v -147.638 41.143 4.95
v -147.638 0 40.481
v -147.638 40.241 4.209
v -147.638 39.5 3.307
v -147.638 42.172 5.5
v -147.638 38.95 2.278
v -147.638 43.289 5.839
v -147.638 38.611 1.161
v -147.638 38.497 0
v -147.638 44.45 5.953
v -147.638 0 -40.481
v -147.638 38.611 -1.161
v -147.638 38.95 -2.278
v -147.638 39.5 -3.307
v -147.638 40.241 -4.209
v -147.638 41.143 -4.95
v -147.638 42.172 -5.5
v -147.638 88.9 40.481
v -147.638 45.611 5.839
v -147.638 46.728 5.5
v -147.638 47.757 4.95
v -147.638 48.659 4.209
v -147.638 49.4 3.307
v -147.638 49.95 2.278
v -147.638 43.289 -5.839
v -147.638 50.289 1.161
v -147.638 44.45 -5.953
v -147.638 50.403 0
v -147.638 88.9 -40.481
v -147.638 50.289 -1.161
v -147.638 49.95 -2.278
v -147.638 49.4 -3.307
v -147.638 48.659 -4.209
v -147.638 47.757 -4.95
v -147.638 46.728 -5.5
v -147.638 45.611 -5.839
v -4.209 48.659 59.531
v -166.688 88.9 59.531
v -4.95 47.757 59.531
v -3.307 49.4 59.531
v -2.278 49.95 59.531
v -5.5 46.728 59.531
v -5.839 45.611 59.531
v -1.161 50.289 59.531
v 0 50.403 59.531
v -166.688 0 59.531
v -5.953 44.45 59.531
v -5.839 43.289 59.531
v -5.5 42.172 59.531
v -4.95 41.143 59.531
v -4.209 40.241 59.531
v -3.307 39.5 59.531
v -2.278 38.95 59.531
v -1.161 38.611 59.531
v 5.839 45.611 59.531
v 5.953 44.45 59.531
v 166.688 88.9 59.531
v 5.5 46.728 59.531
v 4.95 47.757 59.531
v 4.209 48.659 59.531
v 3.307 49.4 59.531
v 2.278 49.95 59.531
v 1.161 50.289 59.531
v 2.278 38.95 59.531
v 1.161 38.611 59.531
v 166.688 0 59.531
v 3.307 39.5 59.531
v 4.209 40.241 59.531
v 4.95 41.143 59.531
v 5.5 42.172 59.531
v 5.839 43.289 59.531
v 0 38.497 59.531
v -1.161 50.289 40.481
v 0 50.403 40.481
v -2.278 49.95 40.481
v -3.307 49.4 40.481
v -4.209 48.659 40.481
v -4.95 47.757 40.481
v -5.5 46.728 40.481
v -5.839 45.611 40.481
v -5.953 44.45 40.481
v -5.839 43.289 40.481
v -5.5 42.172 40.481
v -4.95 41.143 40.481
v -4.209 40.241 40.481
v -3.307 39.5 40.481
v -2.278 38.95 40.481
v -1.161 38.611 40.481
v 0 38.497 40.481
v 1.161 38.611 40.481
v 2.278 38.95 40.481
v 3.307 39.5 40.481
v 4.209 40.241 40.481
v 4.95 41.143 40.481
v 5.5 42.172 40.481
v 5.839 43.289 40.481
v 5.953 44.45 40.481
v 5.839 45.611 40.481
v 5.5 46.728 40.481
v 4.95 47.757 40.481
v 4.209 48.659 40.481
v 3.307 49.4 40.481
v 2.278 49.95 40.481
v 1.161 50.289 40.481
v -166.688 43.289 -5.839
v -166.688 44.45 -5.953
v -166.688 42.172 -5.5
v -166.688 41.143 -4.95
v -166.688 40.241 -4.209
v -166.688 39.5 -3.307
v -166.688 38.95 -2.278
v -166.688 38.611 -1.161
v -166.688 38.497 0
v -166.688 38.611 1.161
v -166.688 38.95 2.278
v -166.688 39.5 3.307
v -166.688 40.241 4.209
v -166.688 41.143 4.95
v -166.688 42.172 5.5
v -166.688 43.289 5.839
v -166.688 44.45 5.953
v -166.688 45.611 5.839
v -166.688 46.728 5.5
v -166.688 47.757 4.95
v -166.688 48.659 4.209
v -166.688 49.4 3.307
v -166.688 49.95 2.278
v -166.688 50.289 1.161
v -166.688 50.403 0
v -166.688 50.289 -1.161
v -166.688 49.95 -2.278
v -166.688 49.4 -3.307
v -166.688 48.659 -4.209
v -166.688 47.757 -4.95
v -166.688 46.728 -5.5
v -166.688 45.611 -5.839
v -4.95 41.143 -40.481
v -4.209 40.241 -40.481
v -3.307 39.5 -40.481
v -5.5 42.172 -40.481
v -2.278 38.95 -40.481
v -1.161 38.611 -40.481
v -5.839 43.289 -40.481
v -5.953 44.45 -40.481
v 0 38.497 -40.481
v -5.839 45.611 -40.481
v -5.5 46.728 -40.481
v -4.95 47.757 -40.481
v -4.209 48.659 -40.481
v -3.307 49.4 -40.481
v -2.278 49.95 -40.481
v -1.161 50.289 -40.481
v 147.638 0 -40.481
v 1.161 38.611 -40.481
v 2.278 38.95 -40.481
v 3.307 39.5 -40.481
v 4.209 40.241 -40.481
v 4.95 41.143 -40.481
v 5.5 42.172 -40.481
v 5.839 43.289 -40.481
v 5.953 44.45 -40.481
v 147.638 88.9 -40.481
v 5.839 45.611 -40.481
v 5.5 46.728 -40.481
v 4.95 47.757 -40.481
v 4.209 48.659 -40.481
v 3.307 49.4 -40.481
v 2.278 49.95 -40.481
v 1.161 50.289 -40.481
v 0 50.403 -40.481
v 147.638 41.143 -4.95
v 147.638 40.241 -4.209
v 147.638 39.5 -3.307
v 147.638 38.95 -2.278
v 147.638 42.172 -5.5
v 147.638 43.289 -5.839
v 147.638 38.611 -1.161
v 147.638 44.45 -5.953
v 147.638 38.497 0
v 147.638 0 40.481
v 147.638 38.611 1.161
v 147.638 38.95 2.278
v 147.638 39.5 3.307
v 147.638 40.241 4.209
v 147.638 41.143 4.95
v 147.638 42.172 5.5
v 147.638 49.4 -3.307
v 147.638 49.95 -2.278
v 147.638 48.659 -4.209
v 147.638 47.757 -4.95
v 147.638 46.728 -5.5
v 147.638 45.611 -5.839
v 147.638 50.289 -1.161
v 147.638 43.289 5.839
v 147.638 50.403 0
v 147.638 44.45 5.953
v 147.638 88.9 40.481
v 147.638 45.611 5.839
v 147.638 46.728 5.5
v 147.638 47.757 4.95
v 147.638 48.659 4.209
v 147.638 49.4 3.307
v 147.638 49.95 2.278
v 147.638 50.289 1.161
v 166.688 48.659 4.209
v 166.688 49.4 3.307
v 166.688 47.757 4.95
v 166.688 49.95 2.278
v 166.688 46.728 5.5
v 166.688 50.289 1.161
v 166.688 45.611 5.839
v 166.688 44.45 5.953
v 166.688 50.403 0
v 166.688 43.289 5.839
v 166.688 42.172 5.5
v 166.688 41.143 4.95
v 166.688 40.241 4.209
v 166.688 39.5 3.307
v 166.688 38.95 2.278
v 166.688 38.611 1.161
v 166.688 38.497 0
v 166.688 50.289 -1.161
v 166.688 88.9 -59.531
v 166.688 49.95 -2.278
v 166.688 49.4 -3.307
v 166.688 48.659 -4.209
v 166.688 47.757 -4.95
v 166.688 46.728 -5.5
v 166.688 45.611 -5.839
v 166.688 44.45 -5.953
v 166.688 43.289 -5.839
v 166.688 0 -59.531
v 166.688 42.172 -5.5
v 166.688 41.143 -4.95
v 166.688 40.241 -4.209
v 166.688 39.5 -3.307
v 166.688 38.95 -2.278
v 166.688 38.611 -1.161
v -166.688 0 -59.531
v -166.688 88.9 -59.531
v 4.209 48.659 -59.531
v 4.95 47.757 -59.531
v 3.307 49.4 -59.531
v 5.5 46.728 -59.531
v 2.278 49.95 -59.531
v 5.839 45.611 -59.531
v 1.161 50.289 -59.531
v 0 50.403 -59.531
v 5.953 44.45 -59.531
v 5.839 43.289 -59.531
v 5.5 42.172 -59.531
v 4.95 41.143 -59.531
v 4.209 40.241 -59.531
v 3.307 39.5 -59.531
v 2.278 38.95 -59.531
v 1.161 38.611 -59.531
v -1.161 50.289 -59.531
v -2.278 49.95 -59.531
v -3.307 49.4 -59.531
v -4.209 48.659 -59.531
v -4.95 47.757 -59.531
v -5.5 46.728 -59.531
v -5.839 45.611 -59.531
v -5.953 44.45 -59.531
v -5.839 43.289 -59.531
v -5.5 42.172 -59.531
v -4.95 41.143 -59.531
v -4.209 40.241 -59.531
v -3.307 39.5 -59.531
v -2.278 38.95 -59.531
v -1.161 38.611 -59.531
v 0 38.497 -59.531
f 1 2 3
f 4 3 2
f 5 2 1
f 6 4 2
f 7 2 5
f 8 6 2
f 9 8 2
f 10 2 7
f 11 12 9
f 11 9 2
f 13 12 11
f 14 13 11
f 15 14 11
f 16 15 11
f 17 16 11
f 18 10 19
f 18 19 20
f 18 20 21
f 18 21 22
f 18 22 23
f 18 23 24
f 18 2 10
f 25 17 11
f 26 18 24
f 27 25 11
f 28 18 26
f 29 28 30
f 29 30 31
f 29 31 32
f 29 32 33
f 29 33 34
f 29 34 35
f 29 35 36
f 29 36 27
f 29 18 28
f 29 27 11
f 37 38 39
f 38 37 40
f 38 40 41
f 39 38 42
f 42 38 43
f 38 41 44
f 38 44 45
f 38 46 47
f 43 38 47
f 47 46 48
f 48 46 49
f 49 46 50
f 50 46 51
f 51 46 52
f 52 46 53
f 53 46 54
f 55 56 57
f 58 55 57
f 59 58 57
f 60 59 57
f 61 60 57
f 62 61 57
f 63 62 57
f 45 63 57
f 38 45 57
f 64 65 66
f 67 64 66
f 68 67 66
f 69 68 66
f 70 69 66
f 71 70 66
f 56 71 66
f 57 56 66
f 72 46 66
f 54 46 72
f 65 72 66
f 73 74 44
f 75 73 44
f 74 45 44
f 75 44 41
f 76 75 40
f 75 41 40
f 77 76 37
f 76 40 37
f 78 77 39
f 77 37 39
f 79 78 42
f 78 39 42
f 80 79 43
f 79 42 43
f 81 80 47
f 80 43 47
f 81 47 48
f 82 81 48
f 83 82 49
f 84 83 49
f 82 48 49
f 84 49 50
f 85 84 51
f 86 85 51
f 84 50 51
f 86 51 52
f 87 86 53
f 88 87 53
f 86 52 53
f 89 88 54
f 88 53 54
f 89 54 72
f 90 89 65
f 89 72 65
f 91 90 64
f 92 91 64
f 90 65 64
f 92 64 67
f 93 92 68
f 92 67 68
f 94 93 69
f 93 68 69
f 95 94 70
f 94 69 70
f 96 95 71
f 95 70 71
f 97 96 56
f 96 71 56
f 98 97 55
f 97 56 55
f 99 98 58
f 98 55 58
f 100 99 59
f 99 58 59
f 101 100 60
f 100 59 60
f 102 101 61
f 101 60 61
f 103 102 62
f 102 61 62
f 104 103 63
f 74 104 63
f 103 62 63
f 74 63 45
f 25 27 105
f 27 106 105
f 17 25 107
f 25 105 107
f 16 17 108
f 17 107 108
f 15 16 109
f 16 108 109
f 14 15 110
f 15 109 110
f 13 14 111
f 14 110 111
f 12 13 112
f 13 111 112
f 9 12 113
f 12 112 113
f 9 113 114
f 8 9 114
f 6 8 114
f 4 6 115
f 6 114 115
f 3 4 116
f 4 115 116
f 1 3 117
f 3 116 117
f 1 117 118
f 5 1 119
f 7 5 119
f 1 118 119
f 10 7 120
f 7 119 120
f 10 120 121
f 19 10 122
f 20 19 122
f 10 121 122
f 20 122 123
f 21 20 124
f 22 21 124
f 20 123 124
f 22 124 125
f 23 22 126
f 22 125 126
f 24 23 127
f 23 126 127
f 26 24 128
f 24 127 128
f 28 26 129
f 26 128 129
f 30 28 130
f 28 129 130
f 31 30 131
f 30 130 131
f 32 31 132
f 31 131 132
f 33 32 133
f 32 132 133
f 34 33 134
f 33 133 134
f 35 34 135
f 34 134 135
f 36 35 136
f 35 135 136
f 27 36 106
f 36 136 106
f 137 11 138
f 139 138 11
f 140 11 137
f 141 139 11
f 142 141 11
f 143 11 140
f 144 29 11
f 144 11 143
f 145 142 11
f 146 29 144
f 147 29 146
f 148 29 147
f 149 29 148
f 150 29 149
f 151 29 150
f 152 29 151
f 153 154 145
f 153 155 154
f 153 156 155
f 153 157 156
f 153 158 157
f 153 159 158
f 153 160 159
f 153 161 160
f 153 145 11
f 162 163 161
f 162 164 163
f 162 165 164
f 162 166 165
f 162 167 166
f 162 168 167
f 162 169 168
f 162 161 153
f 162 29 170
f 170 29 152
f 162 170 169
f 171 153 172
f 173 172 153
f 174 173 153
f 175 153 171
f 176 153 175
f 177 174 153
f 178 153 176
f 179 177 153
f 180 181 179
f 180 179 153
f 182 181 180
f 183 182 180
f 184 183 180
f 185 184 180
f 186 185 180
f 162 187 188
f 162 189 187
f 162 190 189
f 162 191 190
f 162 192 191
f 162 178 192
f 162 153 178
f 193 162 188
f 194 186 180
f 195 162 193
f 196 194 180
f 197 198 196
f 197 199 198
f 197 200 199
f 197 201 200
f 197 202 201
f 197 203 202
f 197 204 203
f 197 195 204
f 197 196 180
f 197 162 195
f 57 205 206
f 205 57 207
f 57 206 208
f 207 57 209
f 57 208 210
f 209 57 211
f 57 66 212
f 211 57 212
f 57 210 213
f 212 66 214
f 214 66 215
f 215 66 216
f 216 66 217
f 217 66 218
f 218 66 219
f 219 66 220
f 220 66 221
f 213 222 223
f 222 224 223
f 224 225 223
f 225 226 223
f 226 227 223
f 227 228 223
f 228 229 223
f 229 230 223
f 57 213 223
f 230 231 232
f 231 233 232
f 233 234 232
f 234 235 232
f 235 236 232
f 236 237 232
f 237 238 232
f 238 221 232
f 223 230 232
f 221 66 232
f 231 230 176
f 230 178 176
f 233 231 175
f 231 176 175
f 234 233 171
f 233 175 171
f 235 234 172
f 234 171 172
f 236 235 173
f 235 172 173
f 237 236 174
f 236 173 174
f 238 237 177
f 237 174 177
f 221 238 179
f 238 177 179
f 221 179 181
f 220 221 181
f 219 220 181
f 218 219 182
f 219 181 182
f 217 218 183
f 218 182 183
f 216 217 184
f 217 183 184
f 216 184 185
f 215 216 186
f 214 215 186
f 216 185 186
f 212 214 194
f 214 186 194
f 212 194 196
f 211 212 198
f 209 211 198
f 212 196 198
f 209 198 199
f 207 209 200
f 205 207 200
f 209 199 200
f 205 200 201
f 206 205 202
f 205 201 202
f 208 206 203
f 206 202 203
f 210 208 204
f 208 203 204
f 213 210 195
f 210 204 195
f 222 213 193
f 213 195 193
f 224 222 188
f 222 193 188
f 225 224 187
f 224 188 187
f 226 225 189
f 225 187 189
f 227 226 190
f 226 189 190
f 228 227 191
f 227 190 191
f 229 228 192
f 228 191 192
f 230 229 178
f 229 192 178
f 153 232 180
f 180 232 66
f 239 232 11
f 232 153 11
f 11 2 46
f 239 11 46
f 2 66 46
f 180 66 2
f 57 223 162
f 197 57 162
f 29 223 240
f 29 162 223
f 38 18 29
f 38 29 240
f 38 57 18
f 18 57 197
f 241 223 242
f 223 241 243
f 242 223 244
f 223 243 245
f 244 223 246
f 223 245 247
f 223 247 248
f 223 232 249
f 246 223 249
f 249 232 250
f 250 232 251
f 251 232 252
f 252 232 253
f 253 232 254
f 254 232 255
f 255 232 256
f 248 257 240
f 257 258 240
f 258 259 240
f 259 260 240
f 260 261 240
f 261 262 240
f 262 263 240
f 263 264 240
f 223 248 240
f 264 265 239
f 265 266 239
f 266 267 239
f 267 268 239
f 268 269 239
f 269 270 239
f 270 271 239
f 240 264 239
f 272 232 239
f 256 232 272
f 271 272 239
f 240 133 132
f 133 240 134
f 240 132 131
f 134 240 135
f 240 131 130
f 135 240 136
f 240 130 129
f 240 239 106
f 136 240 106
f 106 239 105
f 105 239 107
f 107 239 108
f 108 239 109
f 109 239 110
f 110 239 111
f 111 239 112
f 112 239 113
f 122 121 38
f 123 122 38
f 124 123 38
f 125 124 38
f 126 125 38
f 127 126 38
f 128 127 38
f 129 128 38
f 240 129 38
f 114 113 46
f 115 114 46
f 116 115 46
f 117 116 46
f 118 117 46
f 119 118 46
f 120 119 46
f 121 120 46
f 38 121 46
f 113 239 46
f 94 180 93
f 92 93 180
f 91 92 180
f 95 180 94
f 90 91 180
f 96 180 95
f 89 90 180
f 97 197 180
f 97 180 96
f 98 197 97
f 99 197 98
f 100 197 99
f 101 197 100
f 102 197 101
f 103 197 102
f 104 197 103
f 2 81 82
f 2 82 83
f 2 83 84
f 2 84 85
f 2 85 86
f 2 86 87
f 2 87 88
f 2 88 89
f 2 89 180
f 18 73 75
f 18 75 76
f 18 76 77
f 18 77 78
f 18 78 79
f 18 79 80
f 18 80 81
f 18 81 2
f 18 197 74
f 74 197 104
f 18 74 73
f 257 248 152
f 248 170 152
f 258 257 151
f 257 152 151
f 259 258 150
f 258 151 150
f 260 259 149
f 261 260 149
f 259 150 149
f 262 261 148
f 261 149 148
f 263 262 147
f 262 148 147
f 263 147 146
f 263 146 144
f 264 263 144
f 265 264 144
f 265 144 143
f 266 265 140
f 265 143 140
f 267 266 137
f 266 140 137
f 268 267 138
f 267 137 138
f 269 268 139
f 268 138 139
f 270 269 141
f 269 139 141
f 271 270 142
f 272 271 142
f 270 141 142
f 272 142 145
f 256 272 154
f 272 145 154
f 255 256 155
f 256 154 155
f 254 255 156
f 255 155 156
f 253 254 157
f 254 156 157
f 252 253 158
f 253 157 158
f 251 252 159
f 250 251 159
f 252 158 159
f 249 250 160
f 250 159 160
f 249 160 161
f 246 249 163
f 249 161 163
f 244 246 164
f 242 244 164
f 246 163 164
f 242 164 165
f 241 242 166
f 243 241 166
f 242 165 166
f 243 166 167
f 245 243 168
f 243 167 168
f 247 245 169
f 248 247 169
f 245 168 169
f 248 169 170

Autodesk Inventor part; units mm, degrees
ref_plane "YZ Plane" through (0, 0, 0) normal (1, 0, 0) x (0, 1, 0)
ref_plane "XZ Plane" through (0, 0, 0) normal (0, 1, 0) x (-1, 0, 0)
ref_plane "XY Plane" through (0, 0, 0) normal (0, 0, 1) x (1, 0, 0)
sketch "Sketch1" plane through (0, 0, 0) normal (0, 1, 0) x (-1, 0, 0)
  line L0 (-166.6875, -59.5312) -> (166.6875, -59.5312)
  line L1 (166.6875, -59.5312) -> (166.6875, 59.5312)
  line L2 (166.6875, 59.5312) -> (-166.6875, 59.5312)
  line L3 (-166.6875, 59.5312) -> (-166.6875, -59.5312)
  line L4 (-166.6875, -59.5312) -> (166.6875, 59.5312) construction
  line L5 (166.6875, -59.5312) -> (-166.6875, 59.5312) construction
  point P0 (0, 0)
  point P1 (0, 0)
  dimension "d0" = 333.375
  dimension "d1" = 119.0625
extrude "Extrusion1" add sketch "Sketch1" along normal blind 88.9
sketch "Sketch2" plane through (0, 88.9, 0) normal (0, 1, 0) x (1, 0, 0)
  line L0 (166.6875, 59.5312) -> (-166.6875, 59.5312) projected
  line L1 (-166.6875, 59.5312) -> (-166.6875, -59.5312) projected
  line L2 (-166.6875, -59.5312) -> (166.6875, -59.5312) projected
  line L3 (166.6875, -59.5312) -> (166.6875, 59.5312) projected
  line L4 (-147.6375, 40.4812) -> (147.6375, 40.4812)
  line L5 (147.6375, 40.4812) -> (147.6375, -40.4812)
  line L6 (147.6375, -40.4812) -> (-147.6375, -40.4813)
  line L7 (-147.6375, -40.4813) -> (-147.6375, 40.4812)
  point P0 (0, 0)
  dimension "d4" = 19.05
  dimension "d5" = 19.05
  dimension "d6" = 19.05
  dimension "d7" = 19.05
extrude "Extrusion2" cut sketch "Sketch2" against normal through all contours L4 L5 L6 L7
sketch "Sketch3" plane through (166.6875, 0, -59.5312) normal (0, 0, -1) x (-1, 0, 0)
  line L0 (0, 88.9) -> (333.375, 0) construction
  line L1 (0, 0) -> (333.375, 88.9) construction
  point P0 (166.6875, 0)
  point P1 (166.6875, 44.45)
hole "Hole1" at (0, 44.45, -59.5312) direction (0, 0, 1) diameter 11.9062 end through all
sketch "Sketch4" plane through (166.6875, 0, 59.5312) normal (1, 0, 0) x (0, 0, -1)
  line L0 (0, 0) -> (119.0625, 88.9) construction
  line L1 (0, 88.9) -> (119.0625, 0) construction
  point P0 (59.5312, 0)
  point P1 (59.5312, 44.45)
hole "Hole2" at (166.6875, 44.45, 0) direction (-1, 0, 0) diameter 11.9062 end through all
sketch "Sketch5" plane through (0, 88.9, 0) normal (0, 1, 0) x (1, 0, 0)
  line L0 (-147.6375, -40.4813) -> (-147.6375, 40.4812) projected
  line L1 (-147.6375, 40.4812) -> (147.6375, 40.4812) projected
  line L2 (147.6375, 40.4812) -> (147.6375, -40.4812) projected
  line L3 (147.6375, -40.4812) -> (-147.6375, -40.4813) projected
  line L4 (166.6875, 59.5312) -> (-166.6875, 59.5312) projected
  line L5 (-166.6875, 59.5312) -> (-166.6875, -59.5312) projected
  line L6 (-166.6875, -59.5312) -> (166.6875, -59.5312) projected
  line L7 (166.6875, -59.5312) -> (166.6875, 59.5312) projected
  line L8 (0, 59.5312) -> (0, -59.5312) construction
  point P0 (0, 0)
equation "\"d5\" = d4"
equation "\"d6\" = d4"
equation "\"d7\" = d4"
properties part number "gyroWheelCradle01" material "Wood (Maple)"
